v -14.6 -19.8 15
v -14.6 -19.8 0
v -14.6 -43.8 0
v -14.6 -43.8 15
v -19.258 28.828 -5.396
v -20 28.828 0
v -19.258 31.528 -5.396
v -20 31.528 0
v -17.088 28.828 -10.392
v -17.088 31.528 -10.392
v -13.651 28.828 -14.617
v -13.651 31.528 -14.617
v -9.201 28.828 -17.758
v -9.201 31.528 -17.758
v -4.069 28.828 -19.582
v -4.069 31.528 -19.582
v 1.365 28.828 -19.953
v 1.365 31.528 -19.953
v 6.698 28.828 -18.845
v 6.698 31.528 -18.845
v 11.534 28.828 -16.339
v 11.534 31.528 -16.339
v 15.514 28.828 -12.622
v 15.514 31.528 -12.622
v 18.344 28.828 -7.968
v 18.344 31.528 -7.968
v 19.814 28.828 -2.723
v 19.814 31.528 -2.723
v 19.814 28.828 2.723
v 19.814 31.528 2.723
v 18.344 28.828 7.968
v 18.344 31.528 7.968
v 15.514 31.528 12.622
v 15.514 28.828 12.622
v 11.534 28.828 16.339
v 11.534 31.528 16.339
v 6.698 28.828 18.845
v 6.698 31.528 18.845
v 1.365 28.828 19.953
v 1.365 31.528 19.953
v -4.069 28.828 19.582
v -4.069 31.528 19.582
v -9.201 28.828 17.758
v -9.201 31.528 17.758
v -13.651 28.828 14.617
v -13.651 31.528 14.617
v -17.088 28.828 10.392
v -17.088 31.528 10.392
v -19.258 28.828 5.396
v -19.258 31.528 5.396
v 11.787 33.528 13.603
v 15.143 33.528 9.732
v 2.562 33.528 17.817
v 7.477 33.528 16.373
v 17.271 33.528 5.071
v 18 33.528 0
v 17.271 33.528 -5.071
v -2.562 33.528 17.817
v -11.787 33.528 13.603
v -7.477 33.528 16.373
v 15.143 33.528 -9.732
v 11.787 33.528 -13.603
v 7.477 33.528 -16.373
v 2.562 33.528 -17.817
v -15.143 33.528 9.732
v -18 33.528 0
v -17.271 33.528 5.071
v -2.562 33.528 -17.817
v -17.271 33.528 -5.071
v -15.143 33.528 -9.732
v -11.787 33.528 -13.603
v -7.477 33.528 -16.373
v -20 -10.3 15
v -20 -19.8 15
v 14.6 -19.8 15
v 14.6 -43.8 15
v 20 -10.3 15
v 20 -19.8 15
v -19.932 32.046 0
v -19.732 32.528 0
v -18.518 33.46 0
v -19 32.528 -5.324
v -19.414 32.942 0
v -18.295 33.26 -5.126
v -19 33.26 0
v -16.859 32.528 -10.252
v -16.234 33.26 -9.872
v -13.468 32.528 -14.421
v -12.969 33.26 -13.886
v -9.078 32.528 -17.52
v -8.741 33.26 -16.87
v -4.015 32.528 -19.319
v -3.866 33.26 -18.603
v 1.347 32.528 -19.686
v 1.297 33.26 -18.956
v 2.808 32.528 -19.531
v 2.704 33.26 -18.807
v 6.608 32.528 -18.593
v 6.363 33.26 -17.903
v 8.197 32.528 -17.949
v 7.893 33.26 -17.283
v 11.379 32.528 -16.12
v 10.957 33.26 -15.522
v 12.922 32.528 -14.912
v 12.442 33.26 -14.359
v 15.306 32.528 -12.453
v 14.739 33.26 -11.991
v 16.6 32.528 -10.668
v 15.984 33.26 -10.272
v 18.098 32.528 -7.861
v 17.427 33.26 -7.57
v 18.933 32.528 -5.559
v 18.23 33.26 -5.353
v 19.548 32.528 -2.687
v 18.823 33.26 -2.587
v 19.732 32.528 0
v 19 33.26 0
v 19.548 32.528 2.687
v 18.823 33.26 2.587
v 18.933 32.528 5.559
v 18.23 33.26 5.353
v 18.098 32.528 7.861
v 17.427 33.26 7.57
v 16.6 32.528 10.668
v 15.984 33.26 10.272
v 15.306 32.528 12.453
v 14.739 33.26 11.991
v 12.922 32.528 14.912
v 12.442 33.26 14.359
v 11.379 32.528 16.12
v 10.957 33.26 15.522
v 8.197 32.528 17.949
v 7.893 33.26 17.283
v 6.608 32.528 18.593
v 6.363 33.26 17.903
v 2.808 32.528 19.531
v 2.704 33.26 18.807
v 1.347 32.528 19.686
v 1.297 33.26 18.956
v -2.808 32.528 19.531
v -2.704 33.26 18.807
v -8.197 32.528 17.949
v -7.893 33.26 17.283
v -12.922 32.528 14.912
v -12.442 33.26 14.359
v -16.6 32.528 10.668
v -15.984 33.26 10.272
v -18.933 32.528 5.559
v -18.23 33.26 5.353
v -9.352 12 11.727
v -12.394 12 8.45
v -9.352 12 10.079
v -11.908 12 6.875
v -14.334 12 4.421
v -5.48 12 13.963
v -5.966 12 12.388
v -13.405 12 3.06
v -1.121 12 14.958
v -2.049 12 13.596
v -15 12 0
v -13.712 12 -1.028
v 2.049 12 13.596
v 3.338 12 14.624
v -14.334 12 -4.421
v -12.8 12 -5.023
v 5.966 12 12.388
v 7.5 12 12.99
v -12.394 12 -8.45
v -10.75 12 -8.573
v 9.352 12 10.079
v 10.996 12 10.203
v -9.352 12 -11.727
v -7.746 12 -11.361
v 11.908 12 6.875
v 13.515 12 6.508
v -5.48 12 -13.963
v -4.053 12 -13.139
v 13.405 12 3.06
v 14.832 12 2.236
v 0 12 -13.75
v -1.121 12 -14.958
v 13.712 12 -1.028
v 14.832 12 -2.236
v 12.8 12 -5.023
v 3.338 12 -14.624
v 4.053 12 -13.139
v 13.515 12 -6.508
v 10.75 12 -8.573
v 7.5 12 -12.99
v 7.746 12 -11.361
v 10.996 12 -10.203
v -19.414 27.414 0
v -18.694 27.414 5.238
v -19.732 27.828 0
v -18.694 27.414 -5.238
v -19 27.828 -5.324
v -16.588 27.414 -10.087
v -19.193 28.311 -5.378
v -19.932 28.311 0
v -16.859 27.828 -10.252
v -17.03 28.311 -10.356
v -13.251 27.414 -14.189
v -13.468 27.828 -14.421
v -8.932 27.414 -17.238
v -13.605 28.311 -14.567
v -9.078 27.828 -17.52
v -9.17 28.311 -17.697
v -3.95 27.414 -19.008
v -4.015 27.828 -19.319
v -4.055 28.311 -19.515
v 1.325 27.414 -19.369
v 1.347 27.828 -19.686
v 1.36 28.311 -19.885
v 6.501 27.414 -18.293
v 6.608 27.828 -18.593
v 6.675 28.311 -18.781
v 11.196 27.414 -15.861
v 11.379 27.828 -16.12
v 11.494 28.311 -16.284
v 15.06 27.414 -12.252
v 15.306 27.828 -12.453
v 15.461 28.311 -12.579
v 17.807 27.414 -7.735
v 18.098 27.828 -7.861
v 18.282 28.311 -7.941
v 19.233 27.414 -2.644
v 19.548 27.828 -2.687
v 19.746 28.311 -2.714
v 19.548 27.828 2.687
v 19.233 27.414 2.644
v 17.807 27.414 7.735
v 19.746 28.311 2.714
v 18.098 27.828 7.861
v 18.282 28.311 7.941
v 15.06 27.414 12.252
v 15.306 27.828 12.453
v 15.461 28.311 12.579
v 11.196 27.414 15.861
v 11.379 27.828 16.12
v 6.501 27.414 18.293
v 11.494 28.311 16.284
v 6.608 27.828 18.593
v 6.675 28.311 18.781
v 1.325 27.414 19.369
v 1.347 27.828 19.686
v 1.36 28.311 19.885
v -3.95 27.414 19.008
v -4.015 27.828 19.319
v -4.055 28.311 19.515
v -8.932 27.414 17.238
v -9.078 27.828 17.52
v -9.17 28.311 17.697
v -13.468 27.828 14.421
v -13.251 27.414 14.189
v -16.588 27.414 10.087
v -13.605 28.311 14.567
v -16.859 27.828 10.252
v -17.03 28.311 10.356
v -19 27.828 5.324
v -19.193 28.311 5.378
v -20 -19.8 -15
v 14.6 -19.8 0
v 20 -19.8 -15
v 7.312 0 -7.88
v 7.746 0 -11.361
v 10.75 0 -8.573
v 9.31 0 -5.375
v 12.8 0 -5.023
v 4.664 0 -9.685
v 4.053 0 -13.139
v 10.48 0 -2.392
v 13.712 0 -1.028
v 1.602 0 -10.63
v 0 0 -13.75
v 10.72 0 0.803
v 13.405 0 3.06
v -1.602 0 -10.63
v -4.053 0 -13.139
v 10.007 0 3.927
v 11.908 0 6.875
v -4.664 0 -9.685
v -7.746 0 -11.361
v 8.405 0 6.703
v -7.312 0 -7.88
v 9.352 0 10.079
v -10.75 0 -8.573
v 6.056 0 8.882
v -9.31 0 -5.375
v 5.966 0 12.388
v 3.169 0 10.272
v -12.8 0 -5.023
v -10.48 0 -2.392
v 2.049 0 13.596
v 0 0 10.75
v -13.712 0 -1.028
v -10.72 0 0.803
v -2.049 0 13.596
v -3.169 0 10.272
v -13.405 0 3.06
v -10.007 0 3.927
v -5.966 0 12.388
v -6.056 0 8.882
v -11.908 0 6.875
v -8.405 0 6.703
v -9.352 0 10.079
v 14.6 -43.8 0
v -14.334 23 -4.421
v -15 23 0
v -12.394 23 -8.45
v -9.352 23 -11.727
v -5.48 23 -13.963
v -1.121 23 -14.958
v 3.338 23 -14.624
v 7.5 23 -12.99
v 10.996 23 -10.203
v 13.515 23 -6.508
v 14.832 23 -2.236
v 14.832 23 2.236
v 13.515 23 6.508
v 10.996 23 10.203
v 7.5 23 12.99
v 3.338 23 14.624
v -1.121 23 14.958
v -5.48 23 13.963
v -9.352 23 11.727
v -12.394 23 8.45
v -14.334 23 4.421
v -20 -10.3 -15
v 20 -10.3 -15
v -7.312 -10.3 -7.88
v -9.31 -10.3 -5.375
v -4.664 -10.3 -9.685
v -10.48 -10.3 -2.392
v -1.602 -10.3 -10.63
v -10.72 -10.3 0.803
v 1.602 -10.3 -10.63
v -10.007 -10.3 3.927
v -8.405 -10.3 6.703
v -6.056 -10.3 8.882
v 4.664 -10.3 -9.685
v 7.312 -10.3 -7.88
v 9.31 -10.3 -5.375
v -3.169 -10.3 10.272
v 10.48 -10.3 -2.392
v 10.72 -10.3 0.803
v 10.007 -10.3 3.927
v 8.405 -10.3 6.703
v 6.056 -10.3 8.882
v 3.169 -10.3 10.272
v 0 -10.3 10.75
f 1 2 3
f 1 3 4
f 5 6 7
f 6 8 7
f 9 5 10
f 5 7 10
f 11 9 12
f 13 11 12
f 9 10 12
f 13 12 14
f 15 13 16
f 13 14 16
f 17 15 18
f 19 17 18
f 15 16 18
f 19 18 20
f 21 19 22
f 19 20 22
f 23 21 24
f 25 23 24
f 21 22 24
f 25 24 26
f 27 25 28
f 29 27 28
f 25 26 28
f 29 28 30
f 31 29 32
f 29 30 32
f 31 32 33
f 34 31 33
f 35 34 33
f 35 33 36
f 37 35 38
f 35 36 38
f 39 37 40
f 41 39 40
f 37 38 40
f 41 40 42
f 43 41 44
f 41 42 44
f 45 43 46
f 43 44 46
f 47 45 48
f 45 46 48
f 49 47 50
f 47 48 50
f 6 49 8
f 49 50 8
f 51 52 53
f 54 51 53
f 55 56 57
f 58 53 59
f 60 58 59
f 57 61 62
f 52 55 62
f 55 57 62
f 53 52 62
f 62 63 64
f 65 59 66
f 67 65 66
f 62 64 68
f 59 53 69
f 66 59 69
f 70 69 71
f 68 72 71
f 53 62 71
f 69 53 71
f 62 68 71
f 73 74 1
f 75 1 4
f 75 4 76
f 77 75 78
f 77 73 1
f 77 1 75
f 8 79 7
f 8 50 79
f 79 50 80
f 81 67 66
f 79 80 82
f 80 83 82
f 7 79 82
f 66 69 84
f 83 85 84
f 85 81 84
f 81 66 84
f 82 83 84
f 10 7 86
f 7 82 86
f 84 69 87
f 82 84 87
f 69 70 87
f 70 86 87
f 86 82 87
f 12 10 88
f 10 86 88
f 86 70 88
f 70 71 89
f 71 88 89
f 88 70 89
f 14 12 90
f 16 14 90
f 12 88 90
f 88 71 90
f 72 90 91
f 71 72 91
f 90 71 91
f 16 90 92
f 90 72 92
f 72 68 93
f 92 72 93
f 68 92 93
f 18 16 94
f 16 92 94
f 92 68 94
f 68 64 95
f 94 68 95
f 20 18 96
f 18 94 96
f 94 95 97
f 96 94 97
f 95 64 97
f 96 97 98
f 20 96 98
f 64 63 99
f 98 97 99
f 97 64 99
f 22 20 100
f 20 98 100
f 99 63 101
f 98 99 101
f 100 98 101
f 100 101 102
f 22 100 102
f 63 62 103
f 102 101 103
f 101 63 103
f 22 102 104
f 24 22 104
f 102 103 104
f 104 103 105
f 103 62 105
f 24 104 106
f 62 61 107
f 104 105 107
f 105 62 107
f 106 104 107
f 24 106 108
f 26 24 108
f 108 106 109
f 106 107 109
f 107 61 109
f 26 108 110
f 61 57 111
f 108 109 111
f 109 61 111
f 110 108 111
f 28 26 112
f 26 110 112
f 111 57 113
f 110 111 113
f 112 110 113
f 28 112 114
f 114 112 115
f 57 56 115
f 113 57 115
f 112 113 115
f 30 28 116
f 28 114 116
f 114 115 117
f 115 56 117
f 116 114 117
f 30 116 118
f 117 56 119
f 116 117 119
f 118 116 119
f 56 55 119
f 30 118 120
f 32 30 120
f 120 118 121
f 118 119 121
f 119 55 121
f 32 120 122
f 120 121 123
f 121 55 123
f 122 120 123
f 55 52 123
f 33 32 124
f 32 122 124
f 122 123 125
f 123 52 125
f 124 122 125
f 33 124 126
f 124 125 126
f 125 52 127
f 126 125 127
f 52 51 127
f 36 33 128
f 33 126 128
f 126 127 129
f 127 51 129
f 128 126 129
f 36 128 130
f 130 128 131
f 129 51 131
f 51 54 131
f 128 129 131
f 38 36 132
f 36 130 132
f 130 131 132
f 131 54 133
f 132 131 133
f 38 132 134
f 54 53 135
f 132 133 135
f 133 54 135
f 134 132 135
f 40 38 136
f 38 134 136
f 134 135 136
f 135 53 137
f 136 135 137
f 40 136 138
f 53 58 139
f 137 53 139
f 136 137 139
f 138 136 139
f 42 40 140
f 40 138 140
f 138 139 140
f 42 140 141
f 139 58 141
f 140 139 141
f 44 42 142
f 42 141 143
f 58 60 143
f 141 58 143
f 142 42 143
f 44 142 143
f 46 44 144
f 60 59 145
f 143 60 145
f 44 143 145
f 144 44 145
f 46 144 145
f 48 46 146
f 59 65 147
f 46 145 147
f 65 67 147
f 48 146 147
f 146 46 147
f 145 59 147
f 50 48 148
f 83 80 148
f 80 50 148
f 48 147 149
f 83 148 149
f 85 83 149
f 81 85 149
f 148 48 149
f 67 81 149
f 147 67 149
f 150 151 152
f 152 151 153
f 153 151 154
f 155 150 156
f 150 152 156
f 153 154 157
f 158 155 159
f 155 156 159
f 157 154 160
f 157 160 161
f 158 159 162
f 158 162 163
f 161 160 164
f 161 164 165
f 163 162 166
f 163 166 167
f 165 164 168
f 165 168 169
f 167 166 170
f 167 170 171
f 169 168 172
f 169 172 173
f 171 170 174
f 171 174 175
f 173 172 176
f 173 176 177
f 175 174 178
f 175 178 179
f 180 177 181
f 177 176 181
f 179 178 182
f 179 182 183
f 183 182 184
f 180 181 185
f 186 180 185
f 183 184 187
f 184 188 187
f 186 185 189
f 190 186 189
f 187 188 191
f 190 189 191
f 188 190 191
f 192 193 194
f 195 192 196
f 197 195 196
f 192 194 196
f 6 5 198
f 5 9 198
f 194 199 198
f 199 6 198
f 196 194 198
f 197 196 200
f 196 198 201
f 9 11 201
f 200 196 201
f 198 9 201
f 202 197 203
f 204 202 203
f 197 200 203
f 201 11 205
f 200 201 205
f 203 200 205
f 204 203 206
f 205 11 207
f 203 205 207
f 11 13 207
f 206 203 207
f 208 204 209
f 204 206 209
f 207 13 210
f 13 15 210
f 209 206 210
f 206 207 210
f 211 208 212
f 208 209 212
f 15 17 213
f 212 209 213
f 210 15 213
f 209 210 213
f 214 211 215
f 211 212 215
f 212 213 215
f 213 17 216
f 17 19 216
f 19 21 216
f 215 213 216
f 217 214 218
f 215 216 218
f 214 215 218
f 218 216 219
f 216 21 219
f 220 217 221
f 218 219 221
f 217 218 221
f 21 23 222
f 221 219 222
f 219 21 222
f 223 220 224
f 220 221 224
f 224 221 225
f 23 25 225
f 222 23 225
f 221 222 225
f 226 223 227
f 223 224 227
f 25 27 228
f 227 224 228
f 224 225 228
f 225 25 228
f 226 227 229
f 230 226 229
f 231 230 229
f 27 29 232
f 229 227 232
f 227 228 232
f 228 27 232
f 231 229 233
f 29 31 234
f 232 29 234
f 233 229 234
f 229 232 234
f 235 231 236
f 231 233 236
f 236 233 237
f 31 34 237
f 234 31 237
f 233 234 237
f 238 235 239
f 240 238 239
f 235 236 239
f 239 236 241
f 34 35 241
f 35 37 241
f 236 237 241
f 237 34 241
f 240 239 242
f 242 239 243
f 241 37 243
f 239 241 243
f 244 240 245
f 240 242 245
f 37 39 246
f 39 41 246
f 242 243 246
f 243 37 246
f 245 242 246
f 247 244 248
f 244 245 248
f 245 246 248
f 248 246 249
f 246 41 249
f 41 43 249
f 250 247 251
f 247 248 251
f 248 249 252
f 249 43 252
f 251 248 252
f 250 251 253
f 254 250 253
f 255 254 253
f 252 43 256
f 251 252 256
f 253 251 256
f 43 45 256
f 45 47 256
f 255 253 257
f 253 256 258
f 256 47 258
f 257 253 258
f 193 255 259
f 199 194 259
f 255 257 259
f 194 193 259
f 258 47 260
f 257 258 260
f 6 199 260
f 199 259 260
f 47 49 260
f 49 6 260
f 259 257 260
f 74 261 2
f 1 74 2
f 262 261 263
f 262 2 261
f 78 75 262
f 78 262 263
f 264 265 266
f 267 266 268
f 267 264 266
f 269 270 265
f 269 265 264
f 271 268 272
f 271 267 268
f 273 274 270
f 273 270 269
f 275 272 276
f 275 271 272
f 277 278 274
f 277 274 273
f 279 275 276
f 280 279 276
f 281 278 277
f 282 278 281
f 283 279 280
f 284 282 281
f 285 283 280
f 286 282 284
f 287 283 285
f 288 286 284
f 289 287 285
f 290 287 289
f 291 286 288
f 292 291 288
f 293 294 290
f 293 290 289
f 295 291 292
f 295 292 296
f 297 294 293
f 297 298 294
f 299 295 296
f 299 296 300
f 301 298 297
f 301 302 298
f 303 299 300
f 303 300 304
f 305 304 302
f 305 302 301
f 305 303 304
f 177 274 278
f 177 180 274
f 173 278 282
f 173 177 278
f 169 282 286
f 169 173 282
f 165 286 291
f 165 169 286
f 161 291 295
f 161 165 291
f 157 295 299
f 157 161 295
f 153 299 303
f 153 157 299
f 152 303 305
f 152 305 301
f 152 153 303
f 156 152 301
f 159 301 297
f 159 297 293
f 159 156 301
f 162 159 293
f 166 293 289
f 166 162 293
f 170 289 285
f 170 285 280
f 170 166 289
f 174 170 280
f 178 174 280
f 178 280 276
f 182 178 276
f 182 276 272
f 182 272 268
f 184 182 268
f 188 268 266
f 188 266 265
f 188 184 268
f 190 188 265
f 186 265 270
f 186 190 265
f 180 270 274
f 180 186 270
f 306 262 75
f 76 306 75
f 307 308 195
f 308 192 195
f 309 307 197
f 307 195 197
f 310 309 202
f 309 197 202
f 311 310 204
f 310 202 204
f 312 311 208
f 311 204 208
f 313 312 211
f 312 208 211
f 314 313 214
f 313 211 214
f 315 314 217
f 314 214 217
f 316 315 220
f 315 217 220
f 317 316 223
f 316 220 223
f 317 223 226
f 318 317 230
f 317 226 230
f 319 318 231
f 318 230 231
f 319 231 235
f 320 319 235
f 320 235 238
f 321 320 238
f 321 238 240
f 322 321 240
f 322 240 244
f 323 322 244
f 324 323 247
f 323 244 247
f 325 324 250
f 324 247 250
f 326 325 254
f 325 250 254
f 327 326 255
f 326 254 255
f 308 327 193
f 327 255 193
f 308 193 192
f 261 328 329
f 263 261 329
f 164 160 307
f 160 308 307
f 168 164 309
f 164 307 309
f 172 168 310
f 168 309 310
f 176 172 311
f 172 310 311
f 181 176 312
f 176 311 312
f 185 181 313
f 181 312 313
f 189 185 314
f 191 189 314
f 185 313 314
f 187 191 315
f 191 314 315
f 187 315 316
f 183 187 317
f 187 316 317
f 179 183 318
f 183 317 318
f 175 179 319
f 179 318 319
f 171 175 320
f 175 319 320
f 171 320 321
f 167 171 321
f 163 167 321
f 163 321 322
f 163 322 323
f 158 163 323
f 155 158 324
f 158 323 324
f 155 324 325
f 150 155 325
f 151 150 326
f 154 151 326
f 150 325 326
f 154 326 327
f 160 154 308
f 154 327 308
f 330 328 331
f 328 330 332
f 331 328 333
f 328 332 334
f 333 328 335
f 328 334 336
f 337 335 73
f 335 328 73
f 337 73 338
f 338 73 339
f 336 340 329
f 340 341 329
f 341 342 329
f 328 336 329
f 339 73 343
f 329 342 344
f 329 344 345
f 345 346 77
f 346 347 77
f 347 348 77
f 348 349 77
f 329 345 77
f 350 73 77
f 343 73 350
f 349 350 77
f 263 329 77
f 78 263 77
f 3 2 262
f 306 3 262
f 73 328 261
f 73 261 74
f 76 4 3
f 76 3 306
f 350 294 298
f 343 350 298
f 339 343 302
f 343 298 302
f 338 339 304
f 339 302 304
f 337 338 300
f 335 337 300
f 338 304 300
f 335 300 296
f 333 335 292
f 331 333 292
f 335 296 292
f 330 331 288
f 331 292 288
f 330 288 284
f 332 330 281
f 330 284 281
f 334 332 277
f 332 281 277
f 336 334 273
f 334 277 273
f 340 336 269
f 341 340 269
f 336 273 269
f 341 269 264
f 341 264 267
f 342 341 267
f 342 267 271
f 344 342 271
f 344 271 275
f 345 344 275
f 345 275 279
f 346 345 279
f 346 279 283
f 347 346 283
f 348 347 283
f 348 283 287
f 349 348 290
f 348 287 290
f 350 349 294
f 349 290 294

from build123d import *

# Parameters (mm, degrees)
CROQUIS1_W              = 13.75
CROQUIS1_H              = 12
CROQUIS5_R              = 10.75
SALIENTE_EXTRUIR3_DEPTH = 10.3
CROQUIS8_W              = 40
CROQUIS8_H              = 30
SALIENTE_EXTRUIR4_DEPTH = 9.5
CROQUIS9_W              = 29.2
CROQUIS9_H              = 15
SALIENTE_EXTRUIR5_DEPTH = 24


with BuildPart() as part:
    # Croquis1 → Revolución1 (revolve)
    with BuildSketch(Plane.XY, mode=Mode.PRIVATE) as revoluci_n1_sk:
        with Locations((6.875, 6)):
            Rectangle(CROQUIS1_W, CROQUIS1_H)
    revolve(revoluci_n1_sk.sketch.rotate(Axis((0, 0, 0), (0, 1, 0)), 90), axis=Axis((0, 0, 0), (0, 1, 0)))

    # Croquis2 → Revolución2 (revolve)
    with BuildSketch(Plane.XY, mode=Mode.PRIVATE) as revoluci_n2_sk:
        with BuildLine():
            Line((0, 12), (15, 12))
            Line((15, 12), (15, 23))
            Line((15, 23), (19.414213562, 27.414213562))
            ThreePointArc((19.414213562, 27.414213562), (19.847759065, 28.06306026), (20, 28.828427125))
            Line((20, 28.828427125), (20, 31.528143579))
            ThreePointArc((20, 31.528143579), (19.414213562, 32.942357141), (18, 33.528143579))
            Line((18, 33.528143579), (0, 33.528143579))
            Line((0, 33.528143579), (0, 28))
            Line((0, 28), (0, 12))
        make_face()
    revolve(revoluci_n2_sk.sketch.rotate(Axis((0, 28, 0), (0, -1, 0)), 180), axis=Axis((0, 28, 0), (0, -1, 0)))

    # Croquis5 → Saliente-Extruir3 (add)
    with BuildSketch(Plane.XZ):
        with Locations(Location((0, 0, 0), (0, 0, 90))):
            Circle(CROQUIS5_R)
    extrude(amount=SALIENTE_EXTRUIR3_DEPTH)

    # Croquis8 → Saliente-Extruir4 (add)
    with BuildSketch(Plane.XZ.offset(10.3)):
        Rectangle(CROQUIS8_W, CROQUIS8_H)
    extrude(amount=SALIENTE_EXTRUIR4_DEPTH)

    # Croquis9 → Saliente-Extruir5 (add)
    with BuildSketch(Plane.XZ.offset(19.8)):
        with Locations((0, 7.5)):
            Rectangle(CROQUIS9_W, CROQUIS9_H)
    extrude(amount=SALIENTE_EXTRUIR5_DEPTH)


solid = part.part
